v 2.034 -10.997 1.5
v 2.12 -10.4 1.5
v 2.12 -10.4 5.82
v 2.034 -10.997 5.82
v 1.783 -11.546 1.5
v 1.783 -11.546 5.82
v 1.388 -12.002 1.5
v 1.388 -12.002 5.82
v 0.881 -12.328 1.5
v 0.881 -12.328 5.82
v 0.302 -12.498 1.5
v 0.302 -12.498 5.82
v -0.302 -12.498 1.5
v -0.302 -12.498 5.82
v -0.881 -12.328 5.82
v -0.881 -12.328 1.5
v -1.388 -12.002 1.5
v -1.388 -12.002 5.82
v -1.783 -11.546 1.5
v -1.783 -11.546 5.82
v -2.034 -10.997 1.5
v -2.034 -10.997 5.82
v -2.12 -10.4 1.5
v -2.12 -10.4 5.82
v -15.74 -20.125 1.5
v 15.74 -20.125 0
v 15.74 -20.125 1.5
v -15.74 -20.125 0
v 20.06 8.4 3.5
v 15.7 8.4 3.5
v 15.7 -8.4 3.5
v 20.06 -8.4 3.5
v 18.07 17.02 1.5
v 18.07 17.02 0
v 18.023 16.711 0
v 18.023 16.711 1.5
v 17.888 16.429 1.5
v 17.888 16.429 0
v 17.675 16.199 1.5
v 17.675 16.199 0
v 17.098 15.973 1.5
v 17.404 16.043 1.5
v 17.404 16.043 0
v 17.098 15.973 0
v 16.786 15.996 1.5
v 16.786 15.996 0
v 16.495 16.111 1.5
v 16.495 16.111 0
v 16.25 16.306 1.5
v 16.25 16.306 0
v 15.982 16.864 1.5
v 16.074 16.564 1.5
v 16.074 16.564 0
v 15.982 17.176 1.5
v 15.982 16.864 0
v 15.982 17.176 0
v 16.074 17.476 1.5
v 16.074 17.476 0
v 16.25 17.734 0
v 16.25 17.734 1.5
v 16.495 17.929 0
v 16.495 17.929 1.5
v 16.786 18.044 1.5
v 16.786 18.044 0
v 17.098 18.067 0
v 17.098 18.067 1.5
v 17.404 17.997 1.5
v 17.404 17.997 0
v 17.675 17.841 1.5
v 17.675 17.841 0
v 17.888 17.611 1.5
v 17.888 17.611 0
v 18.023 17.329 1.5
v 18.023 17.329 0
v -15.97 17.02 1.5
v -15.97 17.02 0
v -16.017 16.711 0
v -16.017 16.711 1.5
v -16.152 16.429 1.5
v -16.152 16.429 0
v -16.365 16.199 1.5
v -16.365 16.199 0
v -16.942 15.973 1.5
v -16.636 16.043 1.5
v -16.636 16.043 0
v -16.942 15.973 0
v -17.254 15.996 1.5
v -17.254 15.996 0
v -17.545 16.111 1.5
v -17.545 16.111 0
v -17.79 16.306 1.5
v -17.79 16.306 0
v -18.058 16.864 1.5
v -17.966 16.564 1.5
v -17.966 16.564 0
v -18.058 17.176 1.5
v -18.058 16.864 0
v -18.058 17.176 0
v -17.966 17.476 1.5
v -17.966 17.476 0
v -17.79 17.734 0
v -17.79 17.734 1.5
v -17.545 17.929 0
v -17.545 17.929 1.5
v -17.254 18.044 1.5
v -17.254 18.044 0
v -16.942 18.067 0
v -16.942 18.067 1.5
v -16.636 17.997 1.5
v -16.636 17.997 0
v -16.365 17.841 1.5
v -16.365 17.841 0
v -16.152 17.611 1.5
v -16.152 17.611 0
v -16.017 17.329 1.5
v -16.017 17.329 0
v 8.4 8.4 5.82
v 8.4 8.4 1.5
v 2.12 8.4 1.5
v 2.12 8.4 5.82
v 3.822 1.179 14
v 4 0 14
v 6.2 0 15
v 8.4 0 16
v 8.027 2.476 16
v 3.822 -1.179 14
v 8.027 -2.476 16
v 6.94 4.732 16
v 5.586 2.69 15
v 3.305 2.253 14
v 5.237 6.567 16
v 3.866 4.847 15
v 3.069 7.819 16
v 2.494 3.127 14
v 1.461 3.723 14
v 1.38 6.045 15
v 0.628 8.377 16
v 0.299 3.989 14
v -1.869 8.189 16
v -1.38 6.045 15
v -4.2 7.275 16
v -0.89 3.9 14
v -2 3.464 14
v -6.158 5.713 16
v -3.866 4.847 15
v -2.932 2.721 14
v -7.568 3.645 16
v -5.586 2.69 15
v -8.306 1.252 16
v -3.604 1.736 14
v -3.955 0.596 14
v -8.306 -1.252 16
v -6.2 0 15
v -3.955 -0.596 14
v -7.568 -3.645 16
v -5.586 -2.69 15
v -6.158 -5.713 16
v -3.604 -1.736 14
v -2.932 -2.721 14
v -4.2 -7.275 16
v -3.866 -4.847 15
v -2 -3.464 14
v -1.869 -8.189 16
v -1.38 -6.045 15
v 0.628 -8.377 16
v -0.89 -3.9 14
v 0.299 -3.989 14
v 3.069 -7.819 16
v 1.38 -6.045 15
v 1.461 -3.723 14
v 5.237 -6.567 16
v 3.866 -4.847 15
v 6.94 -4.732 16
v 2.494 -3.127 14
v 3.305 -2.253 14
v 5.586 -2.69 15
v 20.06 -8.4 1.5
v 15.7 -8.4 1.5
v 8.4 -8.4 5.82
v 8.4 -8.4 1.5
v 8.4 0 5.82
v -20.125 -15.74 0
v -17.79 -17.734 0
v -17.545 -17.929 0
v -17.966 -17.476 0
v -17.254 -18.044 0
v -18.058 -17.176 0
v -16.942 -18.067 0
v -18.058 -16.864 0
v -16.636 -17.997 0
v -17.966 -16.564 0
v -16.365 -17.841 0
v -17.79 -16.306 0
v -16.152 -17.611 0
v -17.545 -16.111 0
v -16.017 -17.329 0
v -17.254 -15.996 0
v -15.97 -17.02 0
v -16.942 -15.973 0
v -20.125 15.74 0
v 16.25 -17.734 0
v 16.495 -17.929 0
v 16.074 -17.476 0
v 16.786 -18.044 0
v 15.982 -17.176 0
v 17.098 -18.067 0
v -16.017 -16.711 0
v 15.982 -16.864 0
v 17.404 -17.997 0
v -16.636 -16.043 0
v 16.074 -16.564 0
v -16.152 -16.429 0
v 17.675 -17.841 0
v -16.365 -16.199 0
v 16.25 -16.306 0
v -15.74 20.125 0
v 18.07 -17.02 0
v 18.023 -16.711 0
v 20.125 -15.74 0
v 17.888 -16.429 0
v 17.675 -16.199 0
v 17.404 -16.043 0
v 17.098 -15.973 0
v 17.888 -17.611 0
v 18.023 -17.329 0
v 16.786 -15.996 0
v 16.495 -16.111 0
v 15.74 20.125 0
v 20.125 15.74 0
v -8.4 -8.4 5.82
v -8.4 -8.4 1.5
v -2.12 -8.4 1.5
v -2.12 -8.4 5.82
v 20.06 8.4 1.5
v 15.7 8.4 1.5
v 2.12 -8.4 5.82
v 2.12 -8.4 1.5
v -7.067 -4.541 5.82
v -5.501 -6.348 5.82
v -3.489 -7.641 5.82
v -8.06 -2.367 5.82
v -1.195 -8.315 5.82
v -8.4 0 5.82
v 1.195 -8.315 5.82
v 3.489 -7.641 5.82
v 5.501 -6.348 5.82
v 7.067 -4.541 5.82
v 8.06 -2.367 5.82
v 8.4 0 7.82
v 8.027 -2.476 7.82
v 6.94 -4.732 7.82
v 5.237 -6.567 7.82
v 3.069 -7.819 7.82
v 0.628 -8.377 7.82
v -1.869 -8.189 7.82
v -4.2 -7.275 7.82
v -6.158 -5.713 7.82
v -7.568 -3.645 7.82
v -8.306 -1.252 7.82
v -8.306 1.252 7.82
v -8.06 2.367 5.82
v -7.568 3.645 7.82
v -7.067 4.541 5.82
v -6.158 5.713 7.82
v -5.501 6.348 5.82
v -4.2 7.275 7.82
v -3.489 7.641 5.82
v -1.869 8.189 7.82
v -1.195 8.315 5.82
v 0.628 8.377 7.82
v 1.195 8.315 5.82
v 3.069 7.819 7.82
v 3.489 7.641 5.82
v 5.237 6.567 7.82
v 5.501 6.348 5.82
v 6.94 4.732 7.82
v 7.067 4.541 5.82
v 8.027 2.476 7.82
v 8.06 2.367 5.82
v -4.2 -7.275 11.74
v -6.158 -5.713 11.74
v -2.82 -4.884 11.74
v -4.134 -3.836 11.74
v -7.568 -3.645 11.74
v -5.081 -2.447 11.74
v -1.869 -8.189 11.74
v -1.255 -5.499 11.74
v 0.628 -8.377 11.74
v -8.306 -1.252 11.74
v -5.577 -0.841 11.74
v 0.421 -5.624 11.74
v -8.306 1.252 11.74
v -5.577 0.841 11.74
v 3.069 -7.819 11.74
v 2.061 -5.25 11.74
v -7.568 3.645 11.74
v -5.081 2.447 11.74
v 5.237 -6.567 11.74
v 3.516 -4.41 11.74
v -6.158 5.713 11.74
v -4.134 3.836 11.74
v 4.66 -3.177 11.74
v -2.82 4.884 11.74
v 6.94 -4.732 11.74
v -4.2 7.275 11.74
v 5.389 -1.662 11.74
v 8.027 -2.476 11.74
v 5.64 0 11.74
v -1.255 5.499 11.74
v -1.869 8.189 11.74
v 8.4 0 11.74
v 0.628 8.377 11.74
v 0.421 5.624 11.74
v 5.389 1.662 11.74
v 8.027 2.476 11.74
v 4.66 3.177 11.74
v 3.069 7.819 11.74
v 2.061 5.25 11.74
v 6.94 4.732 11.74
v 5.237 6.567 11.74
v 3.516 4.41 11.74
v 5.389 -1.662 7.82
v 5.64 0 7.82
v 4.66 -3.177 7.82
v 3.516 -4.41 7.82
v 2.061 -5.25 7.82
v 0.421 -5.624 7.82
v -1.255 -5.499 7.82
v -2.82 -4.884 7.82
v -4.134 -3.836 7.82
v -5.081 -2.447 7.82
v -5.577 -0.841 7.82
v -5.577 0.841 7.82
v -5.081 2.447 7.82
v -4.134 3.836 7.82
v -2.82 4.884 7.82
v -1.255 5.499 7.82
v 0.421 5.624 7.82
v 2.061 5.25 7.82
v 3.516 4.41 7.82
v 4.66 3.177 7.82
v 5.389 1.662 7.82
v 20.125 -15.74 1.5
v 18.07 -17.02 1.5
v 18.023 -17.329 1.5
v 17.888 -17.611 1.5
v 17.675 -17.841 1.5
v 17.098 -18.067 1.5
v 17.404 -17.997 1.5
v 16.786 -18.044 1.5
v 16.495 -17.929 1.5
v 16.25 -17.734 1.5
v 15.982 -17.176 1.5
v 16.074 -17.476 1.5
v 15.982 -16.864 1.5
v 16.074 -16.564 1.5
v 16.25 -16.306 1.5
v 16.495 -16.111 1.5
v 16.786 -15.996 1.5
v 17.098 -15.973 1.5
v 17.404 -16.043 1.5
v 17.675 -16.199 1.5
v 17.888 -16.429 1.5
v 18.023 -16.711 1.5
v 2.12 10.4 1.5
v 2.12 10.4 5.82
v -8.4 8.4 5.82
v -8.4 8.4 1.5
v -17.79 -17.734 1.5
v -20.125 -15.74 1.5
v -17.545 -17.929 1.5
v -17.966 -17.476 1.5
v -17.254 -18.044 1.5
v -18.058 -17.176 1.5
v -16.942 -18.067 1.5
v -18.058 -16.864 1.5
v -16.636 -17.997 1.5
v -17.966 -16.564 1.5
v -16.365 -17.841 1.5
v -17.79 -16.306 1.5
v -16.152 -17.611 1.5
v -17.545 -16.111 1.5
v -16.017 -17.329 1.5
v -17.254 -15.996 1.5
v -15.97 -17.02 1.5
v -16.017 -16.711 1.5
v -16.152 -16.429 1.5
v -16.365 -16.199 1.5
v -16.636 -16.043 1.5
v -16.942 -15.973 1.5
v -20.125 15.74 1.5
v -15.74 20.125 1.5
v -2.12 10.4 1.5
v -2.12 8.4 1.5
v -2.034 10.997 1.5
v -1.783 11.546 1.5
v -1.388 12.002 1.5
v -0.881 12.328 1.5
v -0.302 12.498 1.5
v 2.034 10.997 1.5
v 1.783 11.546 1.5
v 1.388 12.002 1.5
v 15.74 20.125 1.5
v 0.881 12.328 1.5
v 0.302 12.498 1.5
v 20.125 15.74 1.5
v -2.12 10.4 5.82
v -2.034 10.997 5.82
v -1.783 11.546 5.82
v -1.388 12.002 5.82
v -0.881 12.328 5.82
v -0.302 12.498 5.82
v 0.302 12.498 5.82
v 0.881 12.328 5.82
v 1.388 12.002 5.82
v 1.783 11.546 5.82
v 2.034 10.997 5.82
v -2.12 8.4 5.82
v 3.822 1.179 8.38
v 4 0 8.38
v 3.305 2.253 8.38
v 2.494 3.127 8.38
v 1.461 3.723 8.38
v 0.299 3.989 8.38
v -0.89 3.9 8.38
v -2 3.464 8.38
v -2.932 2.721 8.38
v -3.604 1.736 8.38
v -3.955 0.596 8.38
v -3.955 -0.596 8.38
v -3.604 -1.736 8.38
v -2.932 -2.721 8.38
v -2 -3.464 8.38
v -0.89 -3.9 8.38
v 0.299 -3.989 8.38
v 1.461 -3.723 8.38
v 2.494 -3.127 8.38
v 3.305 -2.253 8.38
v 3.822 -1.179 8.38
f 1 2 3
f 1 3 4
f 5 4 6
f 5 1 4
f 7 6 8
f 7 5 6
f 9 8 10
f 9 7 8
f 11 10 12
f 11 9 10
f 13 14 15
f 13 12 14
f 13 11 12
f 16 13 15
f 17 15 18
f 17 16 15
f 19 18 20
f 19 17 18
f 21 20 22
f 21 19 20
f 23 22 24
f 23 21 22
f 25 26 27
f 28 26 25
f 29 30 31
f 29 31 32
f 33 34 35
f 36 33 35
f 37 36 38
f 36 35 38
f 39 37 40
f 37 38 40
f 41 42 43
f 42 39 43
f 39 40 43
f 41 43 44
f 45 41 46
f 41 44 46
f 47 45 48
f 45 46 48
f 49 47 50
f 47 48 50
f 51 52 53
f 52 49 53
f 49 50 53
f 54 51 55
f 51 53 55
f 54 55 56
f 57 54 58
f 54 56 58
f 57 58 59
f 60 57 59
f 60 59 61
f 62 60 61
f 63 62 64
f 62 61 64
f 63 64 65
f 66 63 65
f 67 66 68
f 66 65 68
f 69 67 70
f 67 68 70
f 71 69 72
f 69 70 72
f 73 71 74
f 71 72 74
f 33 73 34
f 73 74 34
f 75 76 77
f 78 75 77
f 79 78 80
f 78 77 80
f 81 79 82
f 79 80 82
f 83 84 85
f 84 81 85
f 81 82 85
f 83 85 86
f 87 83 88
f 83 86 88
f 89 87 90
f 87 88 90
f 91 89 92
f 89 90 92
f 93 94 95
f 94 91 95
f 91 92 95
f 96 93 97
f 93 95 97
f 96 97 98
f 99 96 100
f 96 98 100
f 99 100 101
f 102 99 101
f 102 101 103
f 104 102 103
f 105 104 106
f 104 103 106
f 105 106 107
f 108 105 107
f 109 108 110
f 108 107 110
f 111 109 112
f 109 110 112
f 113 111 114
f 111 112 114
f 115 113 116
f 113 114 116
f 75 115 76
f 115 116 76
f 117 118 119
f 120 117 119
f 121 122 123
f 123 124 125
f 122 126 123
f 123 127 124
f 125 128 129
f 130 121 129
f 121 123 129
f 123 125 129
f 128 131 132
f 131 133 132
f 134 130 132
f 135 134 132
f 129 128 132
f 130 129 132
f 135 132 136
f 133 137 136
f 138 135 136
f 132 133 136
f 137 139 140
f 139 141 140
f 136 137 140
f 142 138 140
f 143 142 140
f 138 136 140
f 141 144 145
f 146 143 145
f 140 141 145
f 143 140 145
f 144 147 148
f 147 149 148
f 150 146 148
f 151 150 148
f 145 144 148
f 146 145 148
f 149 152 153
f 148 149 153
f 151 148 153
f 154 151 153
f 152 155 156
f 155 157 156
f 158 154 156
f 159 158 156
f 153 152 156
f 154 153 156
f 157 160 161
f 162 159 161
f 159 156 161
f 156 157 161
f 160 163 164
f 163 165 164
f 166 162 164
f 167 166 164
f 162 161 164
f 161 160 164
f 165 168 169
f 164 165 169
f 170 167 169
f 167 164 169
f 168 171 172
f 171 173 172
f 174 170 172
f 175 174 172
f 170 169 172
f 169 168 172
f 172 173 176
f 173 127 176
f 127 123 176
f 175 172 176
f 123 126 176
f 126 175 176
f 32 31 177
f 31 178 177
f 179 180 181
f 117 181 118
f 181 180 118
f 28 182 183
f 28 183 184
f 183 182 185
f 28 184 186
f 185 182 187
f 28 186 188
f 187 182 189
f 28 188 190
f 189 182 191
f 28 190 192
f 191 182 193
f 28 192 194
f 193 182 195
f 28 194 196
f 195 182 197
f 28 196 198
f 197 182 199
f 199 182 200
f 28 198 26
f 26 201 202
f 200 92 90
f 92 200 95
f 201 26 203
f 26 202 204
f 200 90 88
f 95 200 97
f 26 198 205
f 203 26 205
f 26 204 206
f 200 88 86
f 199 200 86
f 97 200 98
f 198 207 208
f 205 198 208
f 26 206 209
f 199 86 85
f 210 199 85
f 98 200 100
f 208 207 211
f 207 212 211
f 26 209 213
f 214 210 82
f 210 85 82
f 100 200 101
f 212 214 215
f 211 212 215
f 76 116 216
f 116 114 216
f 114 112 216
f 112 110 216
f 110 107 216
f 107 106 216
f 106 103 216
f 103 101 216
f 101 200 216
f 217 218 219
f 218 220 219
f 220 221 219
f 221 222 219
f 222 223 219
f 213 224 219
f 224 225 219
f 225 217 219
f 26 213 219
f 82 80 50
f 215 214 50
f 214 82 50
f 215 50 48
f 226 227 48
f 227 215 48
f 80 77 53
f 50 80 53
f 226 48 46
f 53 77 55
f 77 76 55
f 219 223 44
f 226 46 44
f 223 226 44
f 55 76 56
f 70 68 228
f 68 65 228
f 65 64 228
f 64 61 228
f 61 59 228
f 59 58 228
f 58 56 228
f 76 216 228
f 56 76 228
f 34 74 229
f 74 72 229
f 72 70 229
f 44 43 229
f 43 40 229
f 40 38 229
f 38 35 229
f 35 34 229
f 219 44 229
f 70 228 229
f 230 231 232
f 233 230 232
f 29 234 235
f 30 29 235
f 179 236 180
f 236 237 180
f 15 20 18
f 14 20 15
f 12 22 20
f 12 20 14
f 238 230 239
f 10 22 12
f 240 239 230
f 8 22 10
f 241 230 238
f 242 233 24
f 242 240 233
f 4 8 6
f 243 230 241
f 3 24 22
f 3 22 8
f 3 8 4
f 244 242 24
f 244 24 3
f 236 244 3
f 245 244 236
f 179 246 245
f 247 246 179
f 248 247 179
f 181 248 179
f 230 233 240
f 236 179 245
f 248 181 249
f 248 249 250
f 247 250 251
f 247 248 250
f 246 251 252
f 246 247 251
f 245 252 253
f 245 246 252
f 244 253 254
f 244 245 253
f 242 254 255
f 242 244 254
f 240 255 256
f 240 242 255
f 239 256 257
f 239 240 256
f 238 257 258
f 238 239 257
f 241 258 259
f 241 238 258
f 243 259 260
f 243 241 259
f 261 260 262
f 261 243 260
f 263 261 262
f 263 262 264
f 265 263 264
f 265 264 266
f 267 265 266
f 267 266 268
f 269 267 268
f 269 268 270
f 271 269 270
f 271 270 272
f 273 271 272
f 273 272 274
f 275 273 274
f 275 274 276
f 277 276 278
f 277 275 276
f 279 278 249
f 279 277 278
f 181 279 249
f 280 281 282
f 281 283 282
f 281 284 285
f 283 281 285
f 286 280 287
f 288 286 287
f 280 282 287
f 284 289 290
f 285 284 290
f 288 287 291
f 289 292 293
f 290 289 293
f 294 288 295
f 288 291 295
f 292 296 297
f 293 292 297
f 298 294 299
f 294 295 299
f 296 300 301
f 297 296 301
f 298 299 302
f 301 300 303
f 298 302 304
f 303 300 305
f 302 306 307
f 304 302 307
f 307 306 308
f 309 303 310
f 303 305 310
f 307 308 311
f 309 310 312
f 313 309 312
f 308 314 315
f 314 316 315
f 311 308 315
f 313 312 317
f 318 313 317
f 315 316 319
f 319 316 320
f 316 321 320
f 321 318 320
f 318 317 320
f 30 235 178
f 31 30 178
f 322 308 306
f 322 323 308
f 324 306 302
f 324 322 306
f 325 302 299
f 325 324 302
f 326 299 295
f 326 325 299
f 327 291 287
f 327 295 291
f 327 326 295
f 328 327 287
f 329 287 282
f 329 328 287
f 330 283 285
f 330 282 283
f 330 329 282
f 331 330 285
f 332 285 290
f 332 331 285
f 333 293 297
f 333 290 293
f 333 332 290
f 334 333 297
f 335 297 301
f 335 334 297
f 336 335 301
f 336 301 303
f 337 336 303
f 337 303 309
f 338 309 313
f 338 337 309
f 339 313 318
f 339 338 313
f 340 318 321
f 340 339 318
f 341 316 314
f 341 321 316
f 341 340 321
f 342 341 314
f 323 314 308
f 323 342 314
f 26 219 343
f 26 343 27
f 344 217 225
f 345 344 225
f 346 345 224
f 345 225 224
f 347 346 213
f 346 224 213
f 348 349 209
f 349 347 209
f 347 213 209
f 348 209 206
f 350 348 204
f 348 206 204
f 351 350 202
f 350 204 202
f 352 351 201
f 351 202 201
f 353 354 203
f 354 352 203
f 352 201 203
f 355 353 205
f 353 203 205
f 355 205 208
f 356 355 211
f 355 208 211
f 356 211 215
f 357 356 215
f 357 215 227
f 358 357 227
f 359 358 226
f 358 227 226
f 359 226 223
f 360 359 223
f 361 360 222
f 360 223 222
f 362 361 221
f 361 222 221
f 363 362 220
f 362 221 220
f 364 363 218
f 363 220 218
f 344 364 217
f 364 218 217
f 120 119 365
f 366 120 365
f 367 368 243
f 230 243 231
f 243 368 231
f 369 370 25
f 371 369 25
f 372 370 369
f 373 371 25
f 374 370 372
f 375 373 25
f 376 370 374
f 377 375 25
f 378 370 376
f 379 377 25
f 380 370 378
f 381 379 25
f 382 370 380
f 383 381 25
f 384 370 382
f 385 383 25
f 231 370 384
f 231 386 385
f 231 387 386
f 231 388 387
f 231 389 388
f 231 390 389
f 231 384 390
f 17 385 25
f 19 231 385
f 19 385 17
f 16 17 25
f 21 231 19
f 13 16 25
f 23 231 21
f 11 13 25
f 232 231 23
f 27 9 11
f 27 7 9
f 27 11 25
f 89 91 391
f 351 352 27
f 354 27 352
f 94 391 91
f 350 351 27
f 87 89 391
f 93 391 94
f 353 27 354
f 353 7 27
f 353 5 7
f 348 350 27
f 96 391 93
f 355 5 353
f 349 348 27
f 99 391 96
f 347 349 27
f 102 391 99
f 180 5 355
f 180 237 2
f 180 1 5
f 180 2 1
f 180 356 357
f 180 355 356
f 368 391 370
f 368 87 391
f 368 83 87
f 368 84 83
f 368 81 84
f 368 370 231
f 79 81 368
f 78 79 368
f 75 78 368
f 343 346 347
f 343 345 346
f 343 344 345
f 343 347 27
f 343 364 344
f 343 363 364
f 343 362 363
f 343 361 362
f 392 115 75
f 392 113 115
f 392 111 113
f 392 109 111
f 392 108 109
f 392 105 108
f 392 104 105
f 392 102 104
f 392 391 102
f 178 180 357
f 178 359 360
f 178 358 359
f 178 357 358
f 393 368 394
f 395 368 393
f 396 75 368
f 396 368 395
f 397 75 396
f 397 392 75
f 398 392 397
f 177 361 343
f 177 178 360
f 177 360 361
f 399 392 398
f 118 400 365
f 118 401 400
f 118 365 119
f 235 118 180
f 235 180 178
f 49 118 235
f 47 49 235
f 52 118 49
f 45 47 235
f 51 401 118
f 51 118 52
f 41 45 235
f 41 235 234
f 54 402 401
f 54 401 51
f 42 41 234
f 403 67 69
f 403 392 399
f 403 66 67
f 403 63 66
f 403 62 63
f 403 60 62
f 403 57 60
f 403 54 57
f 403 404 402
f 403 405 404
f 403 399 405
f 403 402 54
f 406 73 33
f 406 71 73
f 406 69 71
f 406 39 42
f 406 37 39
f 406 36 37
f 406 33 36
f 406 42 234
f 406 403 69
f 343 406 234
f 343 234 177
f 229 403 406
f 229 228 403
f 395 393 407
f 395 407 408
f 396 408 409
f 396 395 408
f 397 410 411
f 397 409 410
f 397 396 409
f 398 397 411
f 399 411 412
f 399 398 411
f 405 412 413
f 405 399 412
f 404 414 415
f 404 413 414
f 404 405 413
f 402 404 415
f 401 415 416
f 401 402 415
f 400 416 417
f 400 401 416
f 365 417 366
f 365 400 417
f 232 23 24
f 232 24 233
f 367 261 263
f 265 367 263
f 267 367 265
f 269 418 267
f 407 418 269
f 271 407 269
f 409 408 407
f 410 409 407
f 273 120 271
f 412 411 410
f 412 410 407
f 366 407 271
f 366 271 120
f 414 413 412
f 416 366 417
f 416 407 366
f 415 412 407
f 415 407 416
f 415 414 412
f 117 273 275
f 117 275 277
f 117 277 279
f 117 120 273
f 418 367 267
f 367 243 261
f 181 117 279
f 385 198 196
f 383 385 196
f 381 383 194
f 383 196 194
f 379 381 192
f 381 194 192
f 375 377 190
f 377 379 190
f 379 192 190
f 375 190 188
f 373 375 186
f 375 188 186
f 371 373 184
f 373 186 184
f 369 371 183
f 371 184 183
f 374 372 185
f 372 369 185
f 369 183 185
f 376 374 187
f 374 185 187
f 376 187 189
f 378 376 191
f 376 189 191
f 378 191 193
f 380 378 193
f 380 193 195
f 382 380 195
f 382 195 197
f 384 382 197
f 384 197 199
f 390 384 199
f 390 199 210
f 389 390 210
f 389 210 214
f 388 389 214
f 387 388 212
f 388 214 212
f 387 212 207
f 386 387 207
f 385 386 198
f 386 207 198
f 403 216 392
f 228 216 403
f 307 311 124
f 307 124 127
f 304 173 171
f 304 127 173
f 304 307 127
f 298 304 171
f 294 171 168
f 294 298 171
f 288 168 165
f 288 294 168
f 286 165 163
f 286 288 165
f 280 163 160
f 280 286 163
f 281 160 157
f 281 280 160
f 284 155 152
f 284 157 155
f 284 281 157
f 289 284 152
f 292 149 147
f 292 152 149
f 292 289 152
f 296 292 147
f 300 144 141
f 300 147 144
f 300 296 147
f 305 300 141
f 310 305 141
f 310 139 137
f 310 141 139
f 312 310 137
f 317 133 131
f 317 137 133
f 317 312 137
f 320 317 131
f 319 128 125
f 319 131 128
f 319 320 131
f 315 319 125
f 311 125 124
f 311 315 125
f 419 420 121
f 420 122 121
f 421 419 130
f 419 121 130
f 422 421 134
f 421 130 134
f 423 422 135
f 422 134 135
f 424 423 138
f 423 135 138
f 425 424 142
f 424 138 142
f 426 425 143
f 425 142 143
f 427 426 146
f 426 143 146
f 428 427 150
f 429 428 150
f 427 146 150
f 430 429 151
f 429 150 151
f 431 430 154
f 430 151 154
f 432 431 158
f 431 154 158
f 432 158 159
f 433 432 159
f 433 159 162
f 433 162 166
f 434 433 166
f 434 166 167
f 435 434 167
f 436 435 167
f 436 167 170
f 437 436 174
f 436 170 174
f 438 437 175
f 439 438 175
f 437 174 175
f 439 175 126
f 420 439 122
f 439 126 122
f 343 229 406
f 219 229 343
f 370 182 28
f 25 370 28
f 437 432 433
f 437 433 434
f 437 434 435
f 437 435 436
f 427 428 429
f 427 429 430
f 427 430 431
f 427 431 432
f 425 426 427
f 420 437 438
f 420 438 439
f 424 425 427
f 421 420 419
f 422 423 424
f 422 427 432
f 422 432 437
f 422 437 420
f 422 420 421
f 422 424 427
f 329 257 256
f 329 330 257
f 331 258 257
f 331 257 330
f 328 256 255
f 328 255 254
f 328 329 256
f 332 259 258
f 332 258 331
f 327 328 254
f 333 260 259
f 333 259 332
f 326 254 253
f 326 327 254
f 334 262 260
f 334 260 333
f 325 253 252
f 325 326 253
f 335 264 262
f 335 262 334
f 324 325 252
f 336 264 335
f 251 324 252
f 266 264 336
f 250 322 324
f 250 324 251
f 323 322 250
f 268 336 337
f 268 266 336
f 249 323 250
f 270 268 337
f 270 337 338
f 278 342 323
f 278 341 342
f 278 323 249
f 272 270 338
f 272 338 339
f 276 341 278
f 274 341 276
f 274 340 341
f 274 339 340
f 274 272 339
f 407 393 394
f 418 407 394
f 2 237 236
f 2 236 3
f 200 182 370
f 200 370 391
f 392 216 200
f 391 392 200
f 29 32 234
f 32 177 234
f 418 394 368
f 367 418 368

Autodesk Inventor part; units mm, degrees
sketch "Base" plane through (0, 0, 0) normal (0, 0, 1) x (1, 0, 0)
  line L0 (-20.125, 20.125) -> (20.125, 20.125)
  line L1 (20.125, 20.125) -> (20.125, -20.125)
  line L2 (20.125, -20.125) -> (-20.125, -20.125)
  line L3 (-20.125, -20.125) -> (-20.125, 20.125)
  line L4 (-15.74, 20.125) -> (-20.125, 15.74)
  line L5 (15.74, 20.125) -> (20.125, 15.74)
  line L6 (-17.02, 17.02) -> (17.02, 17.02) construction
  line L7 (17.02, 17.02) -> (17.02, -17.02) construction
  line L8 (17.02, -17.02) -> (-17.02, -17.02) construction
  line L9 (-17.02, -17.02) -> (-17.02, 17.02) construction
  line L10 (-17.02, 17.02) -> (17.02, -17.02) construction
  line L11 (17.02, 17.02) -> (-17.02, -17.02) construction
  circle A0 centre (0, 0) radius 8.4
  circle A1 centre (17.02, 17.02) radius 1.05
  circle A2 centre (-17.02, 17.02) radius 1.05
  circle A3 centre (-17.02, -17.02) radius 1.05
  circle A4 centre (17.02, -17.02) radius 1.05
  line L12 (-20.125, -15.74) -> (-15.74, -20.125)
  line L13 (20.125, -15.74) -> (15.74, -20.125)
  point P0 (0, 0)
  point P1 (0, 0)
  dimension "d0" = 40.25
  dimension "d1" = 40.25
  dimension "d2" = 135
  dimension "d3" = 135
  dimension "d4" = 31.48
  dimension "d5" = 34.04
  dimension "d6" = 3.105
  dimension "d7" = 3.105
  dimension "d8" = 3.105
  dimension "d9" = 3.105
  dimension "d10" = 16.8
  dimension "d11" = 2.1
  dimension "d12" = 135
  dimension "d13" = 135
  dimension "d14" = 31.48
  dimension "d15" = 34.04
  dimension "d16" = 31.48
extrude "BaseFeature" add sketch "Base" along normal blind 1.5 contours L0 L5 L1 L13 L2 L12 L3 L4 | A0
extrude "CameraFeature" add sketch "Base" along normal blind 16 contours A0
sketch "Sketch2" plane through (0, 0, 16) normal (0, 0, 1) x (1, 0, 0)
  circle A0 centre (0, 0) radius 8.4 projected
  circle A1 centre (0, 0) radius 4
  point P0 (0, 0)
  dimension "d28" = 8
extrude "Extrusion3" cut sketch "Sketch2" against normal blind 7.62 contours A1
sketch "Sketch4" plane through (0, 0, 1.5) normal (0, 0, 1) x (1, 0, 0)
  circle A0 centre (0, 0) radius 4 projected
  circle A1 centre (0, 0) radius 8.4 projected
  line L0 (-8.4, -8.4) -> (8.4, -8.4)
  line L1 (8.4, -8.4) -> (8.4, 8.4)
  line L2 (8.4, 8.4) -> (-8.4, 8.4)
  line L3 (-8.4, 8.4) -> (-8.4, -8.4)
  circle A2 centre (0, 0) radius 8.4 projected
  point P0 (0, 0)
extrude "Extrusion5" add sketch "Sketch4" along normal blind 4.32 contours A0 | A1 | L1 L0 A1 | A1 L2 L1 | A1 L3 L2 | L0 L3 A1
ref_plane "Work Plane1" through (0, 0, 7.82) normal (0, 0, 1) x (1, 0, 0)
ref_plane "Work Plane2" through (0, 0, 11.74) normal (0, 0, 1) x (1, 0, 0)
sketch "Sketch5" plane through (0, 0, 7.82) normal (0, 0, 1) x (1, 0, 0)
  circle A0 centre (0, 0) radius 8.4 projected
  circle A1 centre (0, 0) radius 5.64
  point P0 (0, 0)
  dimension "d33" = 11.28
extrude "Extrusion6" cut sketch "Sketch5" along normal up to surface (3.92 mm away)
ref_plane "Work Plane3" through (0, 0, 14) normal (0, 0, 1) x (1, 0, 0)
sketch "Sketch6" plane through (0, 0, 16) normal (0, 0, 1) x (1, 0, 0)
  circle A0 centre (0, 0) radius 8.4 projected
  point P0 (0, 0)
sketch "Sketch7" plane through (0, 0, 14) normal (0, 0, 1) x (1, 0, 0)
  circle A0 centre (0, 0) radius 4 projected
  point P0 (0, 0)
loft "Loft1" cut profiles "Sketch7" section 2 edges at (-8.4, 0, 16)
sketch "Sketch8" plane through (0, 0, 1.5) normal (0, 0, 1) x (1, 0, 0)
  line L0 (8.4, 8.4) -> (0, 8.4) projected
  line L1 (0, 8.4) -> (-8.4, 8.4) projected
  line L2 (0, -8.4) -> (8.4, -8.4) projected
  line L3 (-8.4, -8.4) -> (0, -8.4) projected
  line L4 (15.74, 20.125) -> (-15.74, 20.125) construction
  line L5 (0, 20.125) -> (0, 8.4) construction
  line L6 (0, -8.4) -> (0, -20.125) construction
  line L7 (-15.74, -20.125) -> (15.74, -20.125) construction
  circle A0 centre (0, 10.4) radius 2.12
  line L8 (2.12, 10.4) -> (-2.12, 10.4) construction
  line L9 (-2.12, 10.4) -> (-2.12, 8.4)
  line L10 (-2.12, 8.4) -> (2.12, 8.4)
  line L11 (2.12, 8.4) -> (2.12, 10.4)
  line L12 (-28.175, 0) -> (28.175, 0) projected
  circle A1 centre (0, -10.4) radius 2.12
  line L13 (-2.12, -10.4) -> (-2.12, -8.4)
  line L14 (-2.12, -8.4) -> (2.12, -8.4)
  line L15 (2.12, -8.4) -> (2.12, -10.4)
  point P0 (0, 0)
  dimension "d41" = 4.24
  dimension "d42" = 2
extrude "Extrusion7" add sketch "Sketch8" along normal blind 4.32 contours L0 A0 L11 | L0 L1 A0 | L1 L9 A0 | L2 A1 L3 | L2 L15 A1 | A1 L13 L3 picked at (0, 11.1364) picked at (0, -11.1364)
sketch "Sketch9" plane through (0, 0, 1.5) normal (0, 0, 1) x (1, 0, 0)
  line L0 (20.06, 8.4) -> (15.7, 8.4)
  line L1 (15.7, 8.4) -> (15.7, -8.4)
  line L2 (15.7, -8.4) -> (20.06, -8.4)
  line L3 (20.06, -8.4) -> (20.06, 8.4)
  line L4 (8.4, 8.4) -> (2.12, 8.4) projected
  line L5 (2.12, -8.4) -> (8.4, -8.4) projected
  line L6 (8.4, -8.4) -> (8.4, 0) projected
  point P0 (0, 0)
  dimension "d45" = 4.36
  dimension "d46" = 7.3
extrude "Extrusion8" add sketch "Sketch9" along normal blind 2
equation "\"d1\" = d0"
equation "\"d3\" = d2"
equation "\"d7\" = d6"
equation "\"d9\" = d8"
equation "\"d12\" = d2"
equation "\"d13\" = d2"
equation "\"d14\" = d4"
properties part number "Arducam"
